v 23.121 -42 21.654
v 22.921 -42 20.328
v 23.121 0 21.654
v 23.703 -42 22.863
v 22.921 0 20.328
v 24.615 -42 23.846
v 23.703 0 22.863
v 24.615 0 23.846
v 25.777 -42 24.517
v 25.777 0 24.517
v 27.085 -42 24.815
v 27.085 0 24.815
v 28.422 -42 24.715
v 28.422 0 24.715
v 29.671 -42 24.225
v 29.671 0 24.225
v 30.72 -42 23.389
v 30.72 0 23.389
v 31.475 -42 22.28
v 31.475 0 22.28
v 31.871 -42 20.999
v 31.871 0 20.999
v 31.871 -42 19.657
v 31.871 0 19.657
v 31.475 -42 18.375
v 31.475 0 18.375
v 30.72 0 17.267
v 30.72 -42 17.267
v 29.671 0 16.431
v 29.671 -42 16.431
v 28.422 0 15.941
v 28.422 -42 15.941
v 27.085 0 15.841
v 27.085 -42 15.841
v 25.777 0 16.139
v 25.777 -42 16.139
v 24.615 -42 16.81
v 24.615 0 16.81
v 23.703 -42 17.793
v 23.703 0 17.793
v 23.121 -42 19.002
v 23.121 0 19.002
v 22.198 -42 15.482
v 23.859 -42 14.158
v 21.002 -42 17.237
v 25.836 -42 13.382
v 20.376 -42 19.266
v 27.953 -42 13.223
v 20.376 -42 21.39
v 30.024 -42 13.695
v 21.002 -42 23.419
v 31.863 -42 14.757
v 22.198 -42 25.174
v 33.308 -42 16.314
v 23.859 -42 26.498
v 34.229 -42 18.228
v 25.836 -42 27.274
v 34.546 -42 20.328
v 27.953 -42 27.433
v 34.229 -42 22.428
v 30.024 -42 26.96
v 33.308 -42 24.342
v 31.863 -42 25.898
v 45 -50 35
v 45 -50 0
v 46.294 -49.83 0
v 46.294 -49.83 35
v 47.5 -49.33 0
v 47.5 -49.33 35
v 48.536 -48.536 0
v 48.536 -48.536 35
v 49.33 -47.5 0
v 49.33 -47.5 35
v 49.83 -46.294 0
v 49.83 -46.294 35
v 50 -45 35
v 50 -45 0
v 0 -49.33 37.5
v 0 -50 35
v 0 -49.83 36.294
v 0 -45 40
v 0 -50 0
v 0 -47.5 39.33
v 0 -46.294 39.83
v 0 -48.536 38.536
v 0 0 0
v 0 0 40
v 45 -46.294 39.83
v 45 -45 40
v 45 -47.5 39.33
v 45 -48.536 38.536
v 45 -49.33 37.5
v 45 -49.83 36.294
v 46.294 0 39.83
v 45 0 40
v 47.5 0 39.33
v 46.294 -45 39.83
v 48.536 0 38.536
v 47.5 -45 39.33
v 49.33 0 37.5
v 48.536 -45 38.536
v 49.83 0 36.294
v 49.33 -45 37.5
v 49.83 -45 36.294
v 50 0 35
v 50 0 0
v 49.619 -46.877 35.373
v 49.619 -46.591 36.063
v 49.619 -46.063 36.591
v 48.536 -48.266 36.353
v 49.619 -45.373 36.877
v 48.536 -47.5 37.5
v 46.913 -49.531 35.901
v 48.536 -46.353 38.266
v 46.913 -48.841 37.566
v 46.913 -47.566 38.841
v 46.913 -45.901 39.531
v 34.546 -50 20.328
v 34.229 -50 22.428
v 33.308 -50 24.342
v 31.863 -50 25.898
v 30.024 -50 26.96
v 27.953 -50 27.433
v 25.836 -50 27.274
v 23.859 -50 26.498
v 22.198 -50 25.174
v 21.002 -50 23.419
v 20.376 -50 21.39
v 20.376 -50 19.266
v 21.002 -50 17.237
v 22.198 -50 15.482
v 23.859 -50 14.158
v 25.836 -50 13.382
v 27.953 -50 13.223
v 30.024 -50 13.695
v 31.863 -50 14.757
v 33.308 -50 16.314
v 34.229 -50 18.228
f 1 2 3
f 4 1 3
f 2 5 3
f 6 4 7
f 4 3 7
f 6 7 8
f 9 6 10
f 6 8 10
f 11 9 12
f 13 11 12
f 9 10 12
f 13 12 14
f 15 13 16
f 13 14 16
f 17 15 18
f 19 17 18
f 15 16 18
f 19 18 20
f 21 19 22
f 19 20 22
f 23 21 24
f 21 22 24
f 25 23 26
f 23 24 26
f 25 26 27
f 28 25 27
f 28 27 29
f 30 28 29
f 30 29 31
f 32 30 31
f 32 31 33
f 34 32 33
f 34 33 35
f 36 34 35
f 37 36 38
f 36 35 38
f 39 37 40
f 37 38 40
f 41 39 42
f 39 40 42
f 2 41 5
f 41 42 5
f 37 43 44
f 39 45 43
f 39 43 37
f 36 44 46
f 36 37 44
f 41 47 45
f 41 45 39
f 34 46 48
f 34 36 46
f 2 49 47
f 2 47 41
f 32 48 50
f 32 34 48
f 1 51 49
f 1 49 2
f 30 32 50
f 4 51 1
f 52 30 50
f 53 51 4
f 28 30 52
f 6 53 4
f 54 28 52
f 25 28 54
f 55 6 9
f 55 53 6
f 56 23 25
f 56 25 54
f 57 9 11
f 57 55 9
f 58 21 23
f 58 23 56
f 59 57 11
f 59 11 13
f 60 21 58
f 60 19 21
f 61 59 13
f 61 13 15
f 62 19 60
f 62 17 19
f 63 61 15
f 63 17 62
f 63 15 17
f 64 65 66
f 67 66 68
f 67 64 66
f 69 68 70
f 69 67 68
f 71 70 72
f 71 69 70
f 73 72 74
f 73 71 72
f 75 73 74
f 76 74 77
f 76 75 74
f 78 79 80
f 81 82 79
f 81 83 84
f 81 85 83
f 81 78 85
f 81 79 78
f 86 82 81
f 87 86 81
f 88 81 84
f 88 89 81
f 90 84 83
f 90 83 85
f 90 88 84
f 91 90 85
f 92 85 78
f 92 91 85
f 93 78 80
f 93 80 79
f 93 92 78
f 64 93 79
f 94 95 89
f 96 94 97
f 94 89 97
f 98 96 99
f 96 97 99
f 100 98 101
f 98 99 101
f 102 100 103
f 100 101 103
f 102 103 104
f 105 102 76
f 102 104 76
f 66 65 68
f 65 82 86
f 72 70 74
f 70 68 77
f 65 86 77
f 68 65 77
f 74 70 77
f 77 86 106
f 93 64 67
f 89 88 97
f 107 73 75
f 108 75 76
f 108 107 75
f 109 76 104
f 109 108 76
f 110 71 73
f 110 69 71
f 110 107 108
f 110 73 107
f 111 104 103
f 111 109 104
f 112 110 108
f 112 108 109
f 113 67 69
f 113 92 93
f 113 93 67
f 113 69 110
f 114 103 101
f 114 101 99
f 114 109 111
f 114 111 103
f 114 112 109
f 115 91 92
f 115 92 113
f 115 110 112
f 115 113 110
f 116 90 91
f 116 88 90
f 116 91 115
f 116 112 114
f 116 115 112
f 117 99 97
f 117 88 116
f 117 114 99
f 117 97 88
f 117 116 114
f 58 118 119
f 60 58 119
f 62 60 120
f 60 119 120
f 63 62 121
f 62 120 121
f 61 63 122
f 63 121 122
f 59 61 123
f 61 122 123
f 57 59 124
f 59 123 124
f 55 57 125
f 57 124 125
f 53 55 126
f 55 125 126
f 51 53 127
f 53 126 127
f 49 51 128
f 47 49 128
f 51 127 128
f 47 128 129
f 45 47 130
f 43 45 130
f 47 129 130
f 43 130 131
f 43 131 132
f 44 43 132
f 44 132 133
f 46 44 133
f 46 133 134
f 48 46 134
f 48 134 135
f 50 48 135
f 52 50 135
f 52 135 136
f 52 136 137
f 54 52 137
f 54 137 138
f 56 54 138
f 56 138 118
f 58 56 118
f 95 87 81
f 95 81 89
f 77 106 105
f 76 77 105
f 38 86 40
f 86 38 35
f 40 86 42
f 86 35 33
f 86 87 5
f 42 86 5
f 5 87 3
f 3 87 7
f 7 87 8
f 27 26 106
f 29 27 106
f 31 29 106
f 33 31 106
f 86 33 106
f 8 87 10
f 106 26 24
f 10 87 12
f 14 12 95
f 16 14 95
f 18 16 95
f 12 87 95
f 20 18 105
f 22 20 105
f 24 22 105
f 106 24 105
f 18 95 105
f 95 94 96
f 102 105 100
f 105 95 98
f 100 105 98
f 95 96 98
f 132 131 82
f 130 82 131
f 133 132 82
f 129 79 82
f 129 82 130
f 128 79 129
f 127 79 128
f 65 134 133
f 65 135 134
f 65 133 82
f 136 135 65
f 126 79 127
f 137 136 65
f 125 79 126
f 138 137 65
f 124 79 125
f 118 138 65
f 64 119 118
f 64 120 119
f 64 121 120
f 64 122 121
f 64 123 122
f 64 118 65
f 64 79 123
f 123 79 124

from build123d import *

# Parameters (mm, degrees)
F0_W           = 50
F0_H           = 40
F1_DEPTH       = 50
F3_D           = 9
F3_CBORE_D     = 14.25
F3_CBORE_DEPTH = 8
F4_R           = 5


with BuildPart() as f1:
    # F0 (on Front) → F1 (new body)
    with BuildSketch(Plane.XZ):
        with Locations((25, 20)):
            Rectangle(F0_W, F0_H)
    extrude(amount=F1_DEPTH)

    # F3 (through all)
    with Locations(Plane.XZ.offset(50)):
        with Locations((27.4210199714, 20.3279424459)):
            CounterBoreHole(F3_D / 2, F3_CBORE_D / 2, F3_CBORE_DEPTH)

    # F4
    f4_edges = [f1.edges().sort_by_distance(p)[0] for p in [
        (25, -50, 40),
        (50, -50, 20),
        (50, -25, 40),
    ]]
    fillet(f4_edges, radius=F4_R)


solid = f1.part
